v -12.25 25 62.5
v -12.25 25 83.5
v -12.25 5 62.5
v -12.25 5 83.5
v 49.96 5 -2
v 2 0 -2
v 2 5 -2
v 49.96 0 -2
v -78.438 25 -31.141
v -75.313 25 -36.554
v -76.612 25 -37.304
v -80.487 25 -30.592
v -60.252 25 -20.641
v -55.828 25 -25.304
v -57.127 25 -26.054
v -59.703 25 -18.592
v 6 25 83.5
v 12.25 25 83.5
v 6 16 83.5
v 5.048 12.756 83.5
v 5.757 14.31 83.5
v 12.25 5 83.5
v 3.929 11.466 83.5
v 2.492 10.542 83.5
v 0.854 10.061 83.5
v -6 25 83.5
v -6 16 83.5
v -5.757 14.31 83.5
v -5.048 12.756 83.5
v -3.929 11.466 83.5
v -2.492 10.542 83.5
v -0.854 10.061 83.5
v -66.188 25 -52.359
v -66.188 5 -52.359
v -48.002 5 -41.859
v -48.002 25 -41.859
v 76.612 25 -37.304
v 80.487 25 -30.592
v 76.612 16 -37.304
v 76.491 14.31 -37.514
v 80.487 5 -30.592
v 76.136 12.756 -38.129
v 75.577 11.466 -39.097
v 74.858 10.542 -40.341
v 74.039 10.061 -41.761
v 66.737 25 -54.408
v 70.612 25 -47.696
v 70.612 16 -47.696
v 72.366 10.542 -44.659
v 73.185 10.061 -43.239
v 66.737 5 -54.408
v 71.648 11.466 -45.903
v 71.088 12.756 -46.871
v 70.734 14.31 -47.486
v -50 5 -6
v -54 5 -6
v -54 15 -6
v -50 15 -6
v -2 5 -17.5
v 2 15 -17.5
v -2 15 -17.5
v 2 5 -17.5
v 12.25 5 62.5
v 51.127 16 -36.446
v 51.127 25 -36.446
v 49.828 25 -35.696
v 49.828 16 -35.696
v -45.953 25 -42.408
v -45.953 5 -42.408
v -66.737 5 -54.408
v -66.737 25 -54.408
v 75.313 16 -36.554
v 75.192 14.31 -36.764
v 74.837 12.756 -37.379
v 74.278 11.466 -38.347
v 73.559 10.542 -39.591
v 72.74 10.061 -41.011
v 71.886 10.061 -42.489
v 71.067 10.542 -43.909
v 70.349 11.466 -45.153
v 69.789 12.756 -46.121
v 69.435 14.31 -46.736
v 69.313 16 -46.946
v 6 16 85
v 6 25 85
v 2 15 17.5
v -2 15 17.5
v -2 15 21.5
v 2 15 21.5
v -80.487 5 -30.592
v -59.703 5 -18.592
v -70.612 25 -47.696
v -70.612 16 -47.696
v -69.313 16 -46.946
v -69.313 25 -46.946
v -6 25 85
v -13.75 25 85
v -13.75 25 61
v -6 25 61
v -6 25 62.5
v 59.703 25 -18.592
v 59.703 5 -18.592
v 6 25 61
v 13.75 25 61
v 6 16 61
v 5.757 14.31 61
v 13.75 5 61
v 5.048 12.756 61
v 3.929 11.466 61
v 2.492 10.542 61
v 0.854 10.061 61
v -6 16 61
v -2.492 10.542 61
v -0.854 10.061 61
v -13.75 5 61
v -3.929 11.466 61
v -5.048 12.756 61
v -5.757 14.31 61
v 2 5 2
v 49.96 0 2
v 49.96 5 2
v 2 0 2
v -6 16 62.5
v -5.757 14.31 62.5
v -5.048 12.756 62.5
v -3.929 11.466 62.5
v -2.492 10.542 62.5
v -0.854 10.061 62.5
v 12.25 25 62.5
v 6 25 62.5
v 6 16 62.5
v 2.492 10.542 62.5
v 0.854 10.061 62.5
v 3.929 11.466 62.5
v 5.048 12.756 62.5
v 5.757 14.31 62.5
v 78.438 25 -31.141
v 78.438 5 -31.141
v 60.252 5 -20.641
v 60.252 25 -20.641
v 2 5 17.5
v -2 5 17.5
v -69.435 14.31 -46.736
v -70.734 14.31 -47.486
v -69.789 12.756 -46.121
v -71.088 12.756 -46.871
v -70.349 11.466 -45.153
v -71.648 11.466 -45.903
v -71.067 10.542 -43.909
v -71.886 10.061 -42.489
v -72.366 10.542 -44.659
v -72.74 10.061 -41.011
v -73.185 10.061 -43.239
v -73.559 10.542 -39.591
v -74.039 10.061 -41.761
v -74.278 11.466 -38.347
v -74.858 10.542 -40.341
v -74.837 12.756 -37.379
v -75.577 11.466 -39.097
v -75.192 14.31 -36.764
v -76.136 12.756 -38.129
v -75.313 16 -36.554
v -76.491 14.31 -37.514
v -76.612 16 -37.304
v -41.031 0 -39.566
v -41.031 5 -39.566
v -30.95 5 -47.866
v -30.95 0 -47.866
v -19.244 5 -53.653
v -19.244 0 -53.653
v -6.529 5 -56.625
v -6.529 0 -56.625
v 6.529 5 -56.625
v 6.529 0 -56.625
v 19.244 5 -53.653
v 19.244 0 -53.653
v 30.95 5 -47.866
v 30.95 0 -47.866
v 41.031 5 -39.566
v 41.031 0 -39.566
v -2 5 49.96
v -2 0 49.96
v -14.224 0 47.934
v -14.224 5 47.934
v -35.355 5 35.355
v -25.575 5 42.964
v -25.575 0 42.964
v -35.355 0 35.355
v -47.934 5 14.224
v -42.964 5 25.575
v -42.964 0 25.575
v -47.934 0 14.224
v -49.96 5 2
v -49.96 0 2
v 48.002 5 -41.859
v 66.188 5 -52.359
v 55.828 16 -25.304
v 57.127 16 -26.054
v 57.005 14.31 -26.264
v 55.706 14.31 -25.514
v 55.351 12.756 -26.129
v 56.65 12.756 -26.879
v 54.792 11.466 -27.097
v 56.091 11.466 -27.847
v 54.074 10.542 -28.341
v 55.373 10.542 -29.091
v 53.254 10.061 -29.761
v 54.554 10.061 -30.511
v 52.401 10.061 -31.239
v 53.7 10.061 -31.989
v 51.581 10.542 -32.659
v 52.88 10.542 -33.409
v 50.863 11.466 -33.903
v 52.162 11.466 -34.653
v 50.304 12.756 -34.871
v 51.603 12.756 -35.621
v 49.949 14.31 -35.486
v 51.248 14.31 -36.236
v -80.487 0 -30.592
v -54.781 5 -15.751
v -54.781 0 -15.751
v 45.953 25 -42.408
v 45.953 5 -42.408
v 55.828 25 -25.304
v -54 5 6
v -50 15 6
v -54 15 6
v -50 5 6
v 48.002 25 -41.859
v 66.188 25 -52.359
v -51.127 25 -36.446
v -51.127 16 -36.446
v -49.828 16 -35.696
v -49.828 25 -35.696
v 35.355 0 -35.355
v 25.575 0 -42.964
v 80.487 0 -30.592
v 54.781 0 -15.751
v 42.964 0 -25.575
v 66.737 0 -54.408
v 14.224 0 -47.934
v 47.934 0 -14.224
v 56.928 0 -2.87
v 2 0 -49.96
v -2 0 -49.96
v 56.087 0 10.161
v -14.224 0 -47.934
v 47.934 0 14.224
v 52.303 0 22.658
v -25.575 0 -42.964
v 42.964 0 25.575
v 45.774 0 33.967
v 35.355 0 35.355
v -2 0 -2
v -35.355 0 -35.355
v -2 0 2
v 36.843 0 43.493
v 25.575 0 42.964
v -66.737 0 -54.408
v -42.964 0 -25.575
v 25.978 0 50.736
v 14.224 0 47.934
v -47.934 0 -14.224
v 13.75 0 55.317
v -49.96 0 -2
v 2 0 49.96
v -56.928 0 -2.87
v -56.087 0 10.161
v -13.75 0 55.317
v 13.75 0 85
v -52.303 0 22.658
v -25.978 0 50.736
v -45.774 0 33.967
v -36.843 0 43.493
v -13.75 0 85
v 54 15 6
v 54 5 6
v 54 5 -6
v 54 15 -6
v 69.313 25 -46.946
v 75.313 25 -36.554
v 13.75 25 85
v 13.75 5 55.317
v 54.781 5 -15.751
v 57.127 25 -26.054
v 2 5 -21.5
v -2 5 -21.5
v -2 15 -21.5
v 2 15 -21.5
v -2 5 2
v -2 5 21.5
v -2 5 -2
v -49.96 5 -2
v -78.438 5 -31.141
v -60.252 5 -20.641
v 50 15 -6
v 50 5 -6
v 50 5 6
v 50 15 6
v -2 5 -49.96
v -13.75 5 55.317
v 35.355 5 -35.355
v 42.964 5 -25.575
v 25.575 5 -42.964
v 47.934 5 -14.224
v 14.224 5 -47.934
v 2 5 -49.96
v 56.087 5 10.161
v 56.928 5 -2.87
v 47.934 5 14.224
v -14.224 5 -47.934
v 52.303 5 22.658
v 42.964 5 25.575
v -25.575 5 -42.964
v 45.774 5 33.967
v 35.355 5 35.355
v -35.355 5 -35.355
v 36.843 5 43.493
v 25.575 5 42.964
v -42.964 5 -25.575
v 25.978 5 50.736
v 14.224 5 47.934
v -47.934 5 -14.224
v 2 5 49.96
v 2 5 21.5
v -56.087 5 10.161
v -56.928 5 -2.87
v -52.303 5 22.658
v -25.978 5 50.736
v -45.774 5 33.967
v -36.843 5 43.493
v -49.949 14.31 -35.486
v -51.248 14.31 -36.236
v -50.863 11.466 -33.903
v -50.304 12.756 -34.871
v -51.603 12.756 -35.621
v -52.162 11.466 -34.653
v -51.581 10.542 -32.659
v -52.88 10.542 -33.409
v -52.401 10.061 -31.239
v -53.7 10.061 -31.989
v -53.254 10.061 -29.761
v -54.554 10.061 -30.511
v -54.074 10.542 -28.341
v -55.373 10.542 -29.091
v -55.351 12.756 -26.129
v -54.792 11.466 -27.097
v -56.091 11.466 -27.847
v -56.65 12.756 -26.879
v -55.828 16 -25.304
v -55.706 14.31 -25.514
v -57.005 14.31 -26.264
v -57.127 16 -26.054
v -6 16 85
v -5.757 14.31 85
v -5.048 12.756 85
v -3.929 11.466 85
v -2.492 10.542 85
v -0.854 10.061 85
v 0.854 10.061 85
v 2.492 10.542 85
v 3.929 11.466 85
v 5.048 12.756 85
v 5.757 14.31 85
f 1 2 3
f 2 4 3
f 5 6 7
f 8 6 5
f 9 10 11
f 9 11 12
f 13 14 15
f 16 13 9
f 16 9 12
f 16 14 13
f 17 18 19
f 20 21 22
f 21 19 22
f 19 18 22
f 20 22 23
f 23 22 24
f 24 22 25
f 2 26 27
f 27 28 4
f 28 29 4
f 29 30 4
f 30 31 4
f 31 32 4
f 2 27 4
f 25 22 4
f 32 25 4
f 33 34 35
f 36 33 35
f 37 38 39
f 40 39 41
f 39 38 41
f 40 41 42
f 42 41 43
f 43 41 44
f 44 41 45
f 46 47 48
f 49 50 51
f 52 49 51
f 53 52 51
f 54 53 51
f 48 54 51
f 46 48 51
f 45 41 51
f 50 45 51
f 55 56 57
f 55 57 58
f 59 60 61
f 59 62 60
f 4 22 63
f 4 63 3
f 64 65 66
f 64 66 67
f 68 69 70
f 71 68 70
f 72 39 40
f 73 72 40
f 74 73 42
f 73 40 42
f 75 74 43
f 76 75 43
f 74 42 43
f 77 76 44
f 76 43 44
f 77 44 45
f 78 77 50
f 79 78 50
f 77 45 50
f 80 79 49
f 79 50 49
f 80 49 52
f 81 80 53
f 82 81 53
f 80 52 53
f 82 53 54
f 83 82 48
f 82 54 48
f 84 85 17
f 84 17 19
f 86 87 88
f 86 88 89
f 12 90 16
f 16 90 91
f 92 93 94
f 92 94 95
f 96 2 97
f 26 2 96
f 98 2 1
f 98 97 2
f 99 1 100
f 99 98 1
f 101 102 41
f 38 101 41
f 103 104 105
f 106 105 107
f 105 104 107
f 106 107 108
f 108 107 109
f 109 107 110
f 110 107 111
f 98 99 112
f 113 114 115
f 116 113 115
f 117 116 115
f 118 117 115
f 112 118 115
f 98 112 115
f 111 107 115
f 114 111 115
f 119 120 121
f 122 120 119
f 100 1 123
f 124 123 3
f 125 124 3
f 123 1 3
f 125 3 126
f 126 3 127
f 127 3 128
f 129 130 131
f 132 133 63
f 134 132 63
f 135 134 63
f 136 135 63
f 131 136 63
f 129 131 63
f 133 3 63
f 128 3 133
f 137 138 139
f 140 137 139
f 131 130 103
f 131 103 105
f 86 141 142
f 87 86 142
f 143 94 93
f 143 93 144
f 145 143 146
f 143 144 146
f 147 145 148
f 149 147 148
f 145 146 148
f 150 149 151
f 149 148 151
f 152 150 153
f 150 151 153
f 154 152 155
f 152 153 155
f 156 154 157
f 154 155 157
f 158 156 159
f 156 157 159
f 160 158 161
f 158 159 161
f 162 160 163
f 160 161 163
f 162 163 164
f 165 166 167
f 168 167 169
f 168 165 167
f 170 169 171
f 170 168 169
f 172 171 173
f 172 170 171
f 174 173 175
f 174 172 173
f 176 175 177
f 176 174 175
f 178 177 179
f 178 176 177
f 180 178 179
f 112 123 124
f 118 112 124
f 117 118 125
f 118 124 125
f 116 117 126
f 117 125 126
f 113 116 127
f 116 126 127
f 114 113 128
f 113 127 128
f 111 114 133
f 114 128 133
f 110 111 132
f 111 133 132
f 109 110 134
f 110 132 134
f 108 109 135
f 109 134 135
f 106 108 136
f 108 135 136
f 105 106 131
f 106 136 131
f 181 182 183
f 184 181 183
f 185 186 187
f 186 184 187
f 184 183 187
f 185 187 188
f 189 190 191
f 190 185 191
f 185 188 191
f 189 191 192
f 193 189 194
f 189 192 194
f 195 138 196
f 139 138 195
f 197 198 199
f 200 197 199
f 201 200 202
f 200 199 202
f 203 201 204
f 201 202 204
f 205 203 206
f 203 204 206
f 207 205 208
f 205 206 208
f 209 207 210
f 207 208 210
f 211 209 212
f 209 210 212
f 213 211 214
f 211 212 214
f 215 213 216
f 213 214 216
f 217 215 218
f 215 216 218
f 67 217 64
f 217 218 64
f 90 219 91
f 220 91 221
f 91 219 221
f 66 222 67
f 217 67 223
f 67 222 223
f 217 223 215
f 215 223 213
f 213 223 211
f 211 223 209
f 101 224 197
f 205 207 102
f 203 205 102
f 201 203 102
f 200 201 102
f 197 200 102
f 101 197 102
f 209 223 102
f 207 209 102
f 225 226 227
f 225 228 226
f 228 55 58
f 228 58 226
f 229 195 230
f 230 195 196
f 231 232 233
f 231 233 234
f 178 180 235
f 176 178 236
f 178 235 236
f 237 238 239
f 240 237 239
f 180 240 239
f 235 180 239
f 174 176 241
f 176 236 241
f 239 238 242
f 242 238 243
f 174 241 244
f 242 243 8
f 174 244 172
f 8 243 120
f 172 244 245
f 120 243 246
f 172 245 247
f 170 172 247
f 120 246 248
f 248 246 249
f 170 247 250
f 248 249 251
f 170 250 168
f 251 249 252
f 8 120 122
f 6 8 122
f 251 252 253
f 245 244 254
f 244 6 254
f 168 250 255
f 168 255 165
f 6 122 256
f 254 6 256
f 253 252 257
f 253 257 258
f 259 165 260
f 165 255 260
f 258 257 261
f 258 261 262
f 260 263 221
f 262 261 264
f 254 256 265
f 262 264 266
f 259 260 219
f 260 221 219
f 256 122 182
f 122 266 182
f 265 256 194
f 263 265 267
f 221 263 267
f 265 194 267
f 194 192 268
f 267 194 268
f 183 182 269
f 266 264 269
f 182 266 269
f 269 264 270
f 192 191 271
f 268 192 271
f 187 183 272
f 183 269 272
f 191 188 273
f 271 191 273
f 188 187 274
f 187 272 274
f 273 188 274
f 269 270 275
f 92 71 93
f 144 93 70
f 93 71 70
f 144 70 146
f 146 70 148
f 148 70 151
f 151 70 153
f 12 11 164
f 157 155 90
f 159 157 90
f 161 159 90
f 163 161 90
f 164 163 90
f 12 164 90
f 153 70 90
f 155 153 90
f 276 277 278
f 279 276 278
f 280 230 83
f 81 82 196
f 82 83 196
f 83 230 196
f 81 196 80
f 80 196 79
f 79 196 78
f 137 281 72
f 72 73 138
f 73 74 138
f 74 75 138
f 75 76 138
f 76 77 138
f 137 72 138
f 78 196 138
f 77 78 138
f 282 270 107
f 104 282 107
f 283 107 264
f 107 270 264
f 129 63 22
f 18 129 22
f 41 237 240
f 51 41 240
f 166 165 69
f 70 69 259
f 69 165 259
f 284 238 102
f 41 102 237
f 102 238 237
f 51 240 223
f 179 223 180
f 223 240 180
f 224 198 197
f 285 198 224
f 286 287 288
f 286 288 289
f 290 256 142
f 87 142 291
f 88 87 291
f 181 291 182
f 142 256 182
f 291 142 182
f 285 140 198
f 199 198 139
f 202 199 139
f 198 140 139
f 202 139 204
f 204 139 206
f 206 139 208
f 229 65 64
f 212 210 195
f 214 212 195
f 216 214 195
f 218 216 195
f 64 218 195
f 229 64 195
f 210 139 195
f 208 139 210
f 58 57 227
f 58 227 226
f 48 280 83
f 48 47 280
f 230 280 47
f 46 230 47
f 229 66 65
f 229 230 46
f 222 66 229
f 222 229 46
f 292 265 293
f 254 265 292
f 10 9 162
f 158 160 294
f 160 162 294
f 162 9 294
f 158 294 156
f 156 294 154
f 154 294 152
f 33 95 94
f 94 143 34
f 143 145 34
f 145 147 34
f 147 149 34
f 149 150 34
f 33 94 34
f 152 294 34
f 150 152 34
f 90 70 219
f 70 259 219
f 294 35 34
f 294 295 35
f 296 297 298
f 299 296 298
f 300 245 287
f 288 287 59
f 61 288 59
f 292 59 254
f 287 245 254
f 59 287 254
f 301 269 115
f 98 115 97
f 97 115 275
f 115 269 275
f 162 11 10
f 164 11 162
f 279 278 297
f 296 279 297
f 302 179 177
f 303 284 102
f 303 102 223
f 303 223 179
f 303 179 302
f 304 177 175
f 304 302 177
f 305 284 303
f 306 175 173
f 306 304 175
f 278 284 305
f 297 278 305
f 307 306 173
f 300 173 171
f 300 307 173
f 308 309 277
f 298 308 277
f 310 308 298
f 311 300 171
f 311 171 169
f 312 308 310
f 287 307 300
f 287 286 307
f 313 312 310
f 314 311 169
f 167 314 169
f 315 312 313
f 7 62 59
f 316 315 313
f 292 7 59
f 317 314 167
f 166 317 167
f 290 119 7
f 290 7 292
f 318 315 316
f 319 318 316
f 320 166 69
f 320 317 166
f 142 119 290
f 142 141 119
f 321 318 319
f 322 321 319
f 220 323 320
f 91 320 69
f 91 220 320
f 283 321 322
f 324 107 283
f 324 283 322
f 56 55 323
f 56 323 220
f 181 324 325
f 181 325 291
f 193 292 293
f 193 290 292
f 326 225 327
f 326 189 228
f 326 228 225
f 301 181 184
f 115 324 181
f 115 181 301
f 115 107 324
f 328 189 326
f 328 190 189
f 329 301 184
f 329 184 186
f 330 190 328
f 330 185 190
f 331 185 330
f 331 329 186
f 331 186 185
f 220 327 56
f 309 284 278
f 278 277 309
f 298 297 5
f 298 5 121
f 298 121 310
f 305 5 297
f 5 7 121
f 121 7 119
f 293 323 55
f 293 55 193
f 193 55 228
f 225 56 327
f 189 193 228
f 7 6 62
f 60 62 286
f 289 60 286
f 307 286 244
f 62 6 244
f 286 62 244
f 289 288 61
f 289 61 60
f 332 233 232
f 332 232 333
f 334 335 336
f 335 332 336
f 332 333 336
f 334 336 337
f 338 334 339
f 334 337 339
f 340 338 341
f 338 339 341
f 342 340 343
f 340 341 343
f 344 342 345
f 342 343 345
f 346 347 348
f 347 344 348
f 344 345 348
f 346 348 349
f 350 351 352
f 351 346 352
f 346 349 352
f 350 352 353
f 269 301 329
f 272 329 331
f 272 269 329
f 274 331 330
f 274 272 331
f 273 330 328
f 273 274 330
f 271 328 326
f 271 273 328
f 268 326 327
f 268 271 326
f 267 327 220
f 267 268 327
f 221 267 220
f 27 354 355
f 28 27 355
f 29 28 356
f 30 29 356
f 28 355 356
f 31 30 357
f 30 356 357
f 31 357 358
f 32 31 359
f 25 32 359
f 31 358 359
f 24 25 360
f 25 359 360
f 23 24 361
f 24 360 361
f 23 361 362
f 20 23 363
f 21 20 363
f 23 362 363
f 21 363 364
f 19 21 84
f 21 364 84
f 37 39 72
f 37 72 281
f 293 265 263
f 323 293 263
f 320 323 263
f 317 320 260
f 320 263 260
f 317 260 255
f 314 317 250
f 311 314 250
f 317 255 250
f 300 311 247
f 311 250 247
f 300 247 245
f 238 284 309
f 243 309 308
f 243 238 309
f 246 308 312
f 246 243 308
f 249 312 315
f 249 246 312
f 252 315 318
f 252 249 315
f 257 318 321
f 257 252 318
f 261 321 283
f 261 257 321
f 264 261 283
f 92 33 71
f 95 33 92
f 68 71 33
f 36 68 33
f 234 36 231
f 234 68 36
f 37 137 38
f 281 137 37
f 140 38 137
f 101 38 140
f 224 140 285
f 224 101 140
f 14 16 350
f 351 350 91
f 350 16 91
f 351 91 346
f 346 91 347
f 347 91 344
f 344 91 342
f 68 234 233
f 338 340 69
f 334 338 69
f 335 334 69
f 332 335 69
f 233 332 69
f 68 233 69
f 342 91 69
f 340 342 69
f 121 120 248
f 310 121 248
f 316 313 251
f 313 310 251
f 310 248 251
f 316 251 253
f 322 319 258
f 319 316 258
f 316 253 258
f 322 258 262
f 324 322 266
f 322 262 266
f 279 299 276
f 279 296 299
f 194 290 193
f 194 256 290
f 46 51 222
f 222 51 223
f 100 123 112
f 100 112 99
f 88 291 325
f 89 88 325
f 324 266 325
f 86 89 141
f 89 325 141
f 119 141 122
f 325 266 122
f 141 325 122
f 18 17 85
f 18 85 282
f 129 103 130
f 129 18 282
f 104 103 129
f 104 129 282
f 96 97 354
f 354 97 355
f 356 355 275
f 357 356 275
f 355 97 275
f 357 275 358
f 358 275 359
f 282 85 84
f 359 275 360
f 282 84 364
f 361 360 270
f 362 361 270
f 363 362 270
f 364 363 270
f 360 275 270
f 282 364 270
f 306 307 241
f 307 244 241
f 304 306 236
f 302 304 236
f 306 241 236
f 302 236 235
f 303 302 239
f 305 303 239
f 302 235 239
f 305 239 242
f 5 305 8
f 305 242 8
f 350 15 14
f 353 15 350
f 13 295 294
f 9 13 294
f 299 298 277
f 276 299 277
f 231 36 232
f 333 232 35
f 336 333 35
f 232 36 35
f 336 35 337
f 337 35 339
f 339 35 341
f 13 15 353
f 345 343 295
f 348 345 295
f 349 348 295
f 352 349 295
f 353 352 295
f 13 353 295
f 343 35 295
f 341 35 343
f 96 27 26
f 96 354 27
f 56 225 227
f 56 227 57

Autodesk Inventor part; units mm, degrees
ref_plane "YZ Plane" through (0, 0, 0) normal (1, 0, 0) x (0, 1, 0)
ref_plane "XZ Plane" through (0, 0, 0) normal (0, 1, 0) x (-1, 0, 0)
ref_plane "XY Plane" through (0, 0, 0) normal (0, 0, 1) x (1, 0, 0)
sketch "Sketch1" plane through (0, 0, 0) normal (0, 1, 0) x (-1, 0, 0)
  circle A0 centre (0, 0) radius 57
  circle A1 centre (0, 0) radius 50
  line L0 (0, -85.4) -> (0, 113.4) projected
  line L1 (112.682, 0) -> (-112.682, 0) projected
  line L2 (-50, 2) -> (50, 2)
  line L3 (50, 2) -> (50, -2)
  line L4 (50, -2) -> (-50, -2)
  line L5 (-50, -2) -> (-50, 2)
  line L6 (-50, 2) -> (50, -2) construction
  line L7 (50, 2) -> (-50, -2) construction
  line L8 (2, 50) -> (-2, 50)
  line L9 (-2, 50) -> (-2, -50)
  line L10 (-2, -50) -> (2, -50)
  line L11 (2, -50) -> (2, 50)
  line L12 (2, 50) -> (-2, -50) construction
  line L13 (-2, 50) -> (2, -50) construction
  line L14 (13.75, 85) -> (-13.75, 85)
  line L15 (-13.75, 85) -> (-13.75, 50)
  line L16 (-13.75, 50) -> (13.75, 50)
  line L17 (13.75, 50) -> (13.75, 85)
  line L18 (0, 85) -> (0, 50) construction
  line L19 (13.75, 60) -> (-13.75, 60)
  line L20 (-44.3013, -23.2679) -> (-42.3013, -26.7321)
  line L21 (-36.4263, -36.9078) -> (-50.1763, -13.0922)
  line L22 (-58.8365, -18.0922) -> (-45.0865, -41.9078)
  line L23 (-66.7372, -54.4078) -> (-36.4263, -36.9078)
  line L24 (-50.1763, -13.0922) -> (-80.4872, -30.5922)
  line L25 (-73.6122, -42.5) -> (-43.3013, -25) construction
  line L26 (-80.4872, -30.5922) -> (-66.7372, -54.4078)
  line L27 (42.3013, -26.7321) -> (44.3013, -23.2679)
  line L28 (50.1763, -13.0922) -> (36.4263, -36.9078)
  line L29 (45.0865, -41.9078) -> (58.8365, -18.0922)
  line L30 (80.4872, -30.5922) -> (50.1763, -13.0922)
  line L31 (36.4263, -36.9078) -> (66.7372, -54.4078)
  line L32 (73.6122, -42.5) -> (43.3013, -25) construction
  line L33 (66.7372, -54.4078) -> (80.4872, -30.5922)
  point P0 (2, -49.96)
  point P1 (2, -2)
  point P2 (49.96, -2)
  point P3 (-2, 49.96)
  point P4 (-2, 2)
  point P5 (-49.96, 2)
  point P6 (-2, -49.96)
  point P7 (-49.96, -2)
  point P8 (-2, -2)
  point P9 (-13.75, 55.3167)
  point P10 (-54.7807, -15.7505)
  point P11 (-41.0307, -39.5662)
  point P12 (41.0307, -39.5662)
  point P13 (54.7807, -15.7505)
  point P14 (13.75, 55.3167)
  point P15 (2, 49.96)
  point P16 (49.96, 2)
  point P17 (2, 2)
  dimension "d0" = 114
  dimension "d1" = 100
  dimension "d6" = 100
  dimension "d7" = 4
  dimension "d8" = 4
  dimension "d9" = 100
  dimension "d10" = 27.5
  dimension "d14" = 60
  dimension "d15" = 25
  dimension "d18" = 360
extrude "Extrusion1" add sketch "Sketch1" along normal blind 5 contours L1 L3 L2 A1 L11 L16 L17 A0 | A0 L30 L28 L27 A1 L4 L3 L1 | L17 L16 L8 L0 A0 | A0 L0 L19 L17 | L30 L29 L31 A0 | A0 L31 L28 L27 L30 | L1 L11 L2 A1 | L3 L4 A1 | A1 L4 L11 L1 | A1 L2 L3 | L0 L8 L16 L15 A0 | A0 L15 L19 L0 | L19 L0 L14 L17 | A0 L0 L10 L11 A1 L27 L28 L31 | L30 L33 L31 L29 | L11 L4 L0 L1 | L1 L0 L2 L11 | L15 L16 L9 A1 L2 L5 L1 A0 | L8 L11 A1 | L0 L2 L9 A1 | A1 L11 L2 L0 | A1 L9 L8 | L19 L15 L14 L0 | A0 L23 L21 L20 A1 L9 L10 L0 | L11 A1 L0 L4 | L1 L9 L2 L0 | L0 L4 L9 L1 | L1 L5 L4 A1 L20 L21 L24 A0 | L23 L22 L24 A0 | A0 L24 L21 L20 L23 | L10 L9 A1 | A1 L9 L4 L0 | A1 L11 L10 | L9 L4 A1 L1 | L1 A1 L2 L9 | L5 L2 A1 | A1 L4 L5 | L23 L26 L24 L22
sketch "Sketch5" plane through (0, 5, 0) normal (0, 1, 0) x (1, 0, 0)
  line L0 (-2, -21.5) -> (2, -21.5)
  line L1 (2, -21.5) -> (2, -17.5)
  line L2 (2, -17.5) -> (-2, -17.5)
  line L3 (-2, -17.5) -> (-2, -21.5)
  line L4 (-2, -2) -> (-2, -49.96) construction
  line L5 (2, -49.96) -> (2, -2) construction
  line L6 (-112.682, 0) -> (112.682, 0) construction
  line L7 (-2, 21.5) -> (2, 21.5)
  line L8 (2, 21.5) -> (2, 17.5)
  line L9 (2, 17.5) -> (-2, 17.5)
  line L10 (-2, 17.5) -> (-2, 21.5)
  arc A0 (-49.96, -2) -> (-2, -49.96) centre (0, 0) ccw construction
  arc A1 (-2, 49.96) -> (-49.96, 2) centre (0, 0) ccw construction
  circle A2 centre (0, 0) radius 50 construction
  line L11 (-54, 6) -> (-50, 6)
  line L12 (-50, 6) -> (-50, -6)
  line L13 (-50, -6) -> (-54, -6)
  line L14 (-54, -6) -> (-54, 6)
  line L15 (-54, 0) -> (-50, 0) construction
  line L16 (0, 88.2024) -> (0, -113.8671) construction
  line L17 (54, 6) -> (50, 6)
  line L18 (50, 6) -> (50, -6)
  line L19 (50, -6) -> (54, -6)
  line L20 (54, -6) -> (54, 6)
  line L21 (54, 0) -> (50, 0) construction
  point P0 (49.96, -2)
  point P1 (49.96, 2)
  dimension "d41" = 17.5
  dimension "d42" = 4
  dimension "d43" = 12
extrude "Extrusion4" add sketch "Sketch5" along normal blind 10
sketch "Sketch2" plane through (0, 5, 0) normal (0, 1, 0) x (1, 0, 0)
  line L0 (-13.75, -55.3167) -> (-13.75, -85) projected
  line L1 (13.75, -85) -> (13.75, -55.3167) projected
  line L2 (-13.75, -85) -> (13.75, -85)
  line L3 (13.75, -85) -> (13.75, -61)
  line L4 (13.75, -61) -> (-13.75, -61)
  line L5 (-13.75, -61) -> (-13.75, -85)
  line L6 (-12.25, -62.5) -> (12.25, -62.5)
  line L7 (12.25, -62.5) -> (12.25, -83.5)
  line L8 (12.25, -83.5) -> (-12.25, -83.5)
  line L9 (-12.25, -83.5) -> (-12.25, -62.5)
  line L10 (80.4872, 30.5922) -> (66.7372, 54.4078)
  line L11 (66.7372, 54.4078) -> (45.9525, 42.4078)
  line L12 (45.9525, 42.4078) -> (59.7025, 18.5922)
  line L13 (59.7025, 18.5922) -> (80.4872, 30.5922)
  line L14 (60.2516, 20.6412) -> (48.0016, 41.8588)
  line L15 (48.0016, 41.8588) -> (66.1881, 52.3588)
  line L16 (66.1881, 52.3588) -> (78.4381, 31.1412)
  line L17 (78.4381, 31.1412) -> (60.2516, 20.6412)
  line L18 (-66.7372, 54.4078) -> (-80.4872, 30.5922)
  line L19 (-80.4872, 30.5922) -> (-59.7025, 18.5922)
  line L20 (-59.7025, 18.5922) -> (-45.9525, 42.4078)
  line L21 (-45.9525, 42.4078) -> (-66.7372, 54.4078)
  line L22 (-48.0016, 41.8588) -> (-60.2516, 20.6412)
  line L23 (-60.2516, 20.6412) -> (-78.4381, 31.1412)
  line L24 (-78.4381, 31.1412) -> (-66.1881, 52.3588)
  line L25 (-66.1881, 52.3588) -> (-48.0016, 41.8588)
  point P0 (0, 0)
  point P1 (-13.75, -61)
  point P2 (-13.75, -61)
  dimension "d22" = 24
  dimension "d23" = 1.5
  dimension "d26" = 360
extrude "Extrusion2" add sketch "Sketch2" along normal blind 20 contours L4 L1 L2 L0
sketch "Sketch4" plane through (-13.75, 0, 85) normal (0, 0, 1) x (1, 0, 0)
  line L0 (0, 25) -> (27.5, 25) construction
  line L1 (7.75, 25) -> (19.75, 25)
  line L2 (19.75, 25) -> (19.75, 10)
  line L3 (19.75, 10) -> (7.75, 10)
  line L4 (7.75, 10) -> (7.75, 25)
  line L5 (1.5, 5) -> (26, 5) construction
  line L6 (13.75, -10.2) -> (13.75, 61.2) construction
  circle A0 centre (13.75, 16) radius 6
  point P0 (13.75, 0)
  point P1 (7.75, 16)
  point P2 (19.75, 16)
  dimension "d36" = 12
  dimension "d37" = 5
  dimension "d38" = 6
extrude "Extrusion3" cut sketch "Sketch4" against normal up to surface (24 mm away) contours L1 L2 A0 L4 | A0
pattern_circular "Circular Pattern1" count 3 over 360 about axis through (0, -10, 0) along (0, 1, 0) of "Extrusion2", "Extrusion3"
equation "\"d38\" = 0.5 * d36"
properties part number "bottom3"
